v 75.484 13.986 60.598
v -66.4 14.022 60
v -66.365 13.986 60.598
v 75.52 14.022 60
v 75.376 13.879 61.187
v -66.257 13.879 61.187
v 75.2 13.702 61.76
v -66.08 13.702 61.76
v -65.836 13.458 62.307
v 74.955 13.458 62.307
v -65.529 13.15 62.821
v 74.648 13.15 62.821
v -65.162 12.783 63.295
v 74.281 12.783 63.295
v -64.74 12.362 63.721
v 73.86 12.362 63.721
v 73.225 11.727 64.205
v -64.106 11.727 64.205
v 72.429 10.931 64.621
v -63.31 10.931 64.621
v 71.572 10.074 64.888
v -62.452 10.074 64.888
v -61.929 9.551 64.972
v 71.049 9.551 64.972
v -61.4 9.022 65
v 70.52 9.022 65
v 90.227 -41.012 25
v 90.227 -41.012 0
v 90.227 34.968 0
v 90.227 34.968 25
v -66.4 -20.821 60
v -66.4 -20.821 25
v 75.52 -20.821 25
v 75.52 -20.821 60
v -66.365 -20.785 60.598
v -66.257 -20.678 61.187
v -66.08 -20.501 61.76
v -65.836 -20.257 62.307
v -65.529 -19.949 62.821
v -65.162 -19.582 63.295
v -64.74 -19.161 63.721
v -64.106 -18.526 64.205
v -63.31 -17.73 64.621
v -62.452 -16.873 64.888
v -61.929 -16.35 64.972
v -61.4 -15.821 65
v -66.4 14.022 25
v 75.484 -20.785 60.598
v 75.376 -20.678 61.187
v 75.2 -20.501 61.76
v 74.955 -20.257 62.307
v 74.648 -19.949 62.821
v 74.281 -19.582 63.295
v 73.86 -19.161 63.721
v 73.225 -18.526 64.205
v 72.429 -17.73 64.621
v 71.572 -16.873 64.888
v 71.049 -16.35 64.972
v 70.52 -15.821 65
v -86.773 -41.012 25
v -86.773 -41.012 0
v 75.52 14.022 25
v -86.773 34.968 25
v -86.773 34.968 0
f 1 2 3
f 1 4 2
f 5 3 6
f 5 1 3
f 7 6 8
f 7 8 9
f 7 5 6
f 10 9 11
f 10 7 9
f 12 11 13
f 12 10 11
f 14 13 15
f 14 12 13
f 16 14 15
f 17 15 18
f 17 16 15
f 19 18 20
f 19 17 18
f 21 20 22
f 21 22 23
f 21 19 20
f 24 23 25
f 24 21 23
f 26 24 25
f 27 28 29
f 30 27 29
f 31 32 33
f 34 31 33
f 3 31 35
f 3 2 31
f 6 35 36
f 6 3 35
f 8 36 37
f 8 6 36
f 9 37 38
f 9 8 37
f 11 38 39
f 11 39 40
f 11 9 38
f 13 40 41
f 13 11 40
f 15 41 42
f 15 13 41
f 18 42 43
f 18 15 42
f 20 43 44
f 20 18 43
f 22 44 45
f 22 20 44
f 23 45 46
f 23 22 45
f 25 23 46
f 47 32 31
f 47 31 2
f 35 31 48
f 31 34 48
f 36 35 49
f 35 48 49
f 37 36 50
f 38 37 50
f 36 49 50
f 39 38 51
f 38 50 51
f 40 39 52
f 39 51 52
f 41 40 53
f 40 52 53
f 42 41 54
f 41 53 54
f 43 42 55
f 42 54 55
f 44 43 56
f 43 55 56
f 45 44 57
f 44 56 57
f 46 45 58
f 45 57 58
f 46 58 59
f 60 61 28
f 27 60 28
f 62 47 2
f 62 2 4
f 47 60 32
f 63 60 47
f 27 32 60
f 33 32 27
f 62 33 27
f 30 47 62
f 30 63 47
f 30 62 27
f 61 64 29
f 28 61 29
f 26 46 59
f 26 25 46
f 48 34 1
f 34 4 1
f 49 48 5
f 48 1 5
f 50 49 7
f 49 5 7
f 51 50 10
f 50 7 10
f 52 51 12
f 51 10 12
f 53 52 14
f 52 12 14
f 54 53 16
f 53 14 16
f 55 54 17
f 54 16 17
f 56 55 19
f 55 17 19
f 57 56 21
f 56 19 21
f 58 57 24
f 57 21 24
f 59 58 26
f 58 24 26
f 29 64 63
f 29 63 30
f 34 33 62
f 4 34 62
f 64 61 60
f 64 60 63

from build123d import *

# Parameters (mm, degrees)
F0_W     = 177.00053
F0_H     = 75.980723
F1_DEPTH = 25
F2_W     = 141.91997
F2_H     = 34.842628
F3_DEPTH = 40
F4_R     = 5


with BuildPart() as f1:
    # F0 (on Top) → F1 (new body)
    with BuildSketch(Plane.XY):
        with Locations((1.726832, -3.02196)):
            Rectangle(F0_W, F0_H)
    extrude(amount=F1_DEPTH)

    # F2 (on face) → F3 (join)
    with BuildSketch(Plane.XY.offset(25)):
        with Locations((4.559569, -3.399281)):
            Rectangle(F2_W, F2_H)
    extrude(amount=F3_DEPTH)

    # F4
    f4_edges = [f1.edges().sort_by_distance(p)[0] for p in [
        (4.559569, -20.820595, 65),
        (-66.400416, -3.399281, 65),
        (4.559569, 14.022033, 65),
        (75.519554, -3.399281, 65),
    ]]
    fillet(f4_edges, radius=F4_R)


solid = f1.part
